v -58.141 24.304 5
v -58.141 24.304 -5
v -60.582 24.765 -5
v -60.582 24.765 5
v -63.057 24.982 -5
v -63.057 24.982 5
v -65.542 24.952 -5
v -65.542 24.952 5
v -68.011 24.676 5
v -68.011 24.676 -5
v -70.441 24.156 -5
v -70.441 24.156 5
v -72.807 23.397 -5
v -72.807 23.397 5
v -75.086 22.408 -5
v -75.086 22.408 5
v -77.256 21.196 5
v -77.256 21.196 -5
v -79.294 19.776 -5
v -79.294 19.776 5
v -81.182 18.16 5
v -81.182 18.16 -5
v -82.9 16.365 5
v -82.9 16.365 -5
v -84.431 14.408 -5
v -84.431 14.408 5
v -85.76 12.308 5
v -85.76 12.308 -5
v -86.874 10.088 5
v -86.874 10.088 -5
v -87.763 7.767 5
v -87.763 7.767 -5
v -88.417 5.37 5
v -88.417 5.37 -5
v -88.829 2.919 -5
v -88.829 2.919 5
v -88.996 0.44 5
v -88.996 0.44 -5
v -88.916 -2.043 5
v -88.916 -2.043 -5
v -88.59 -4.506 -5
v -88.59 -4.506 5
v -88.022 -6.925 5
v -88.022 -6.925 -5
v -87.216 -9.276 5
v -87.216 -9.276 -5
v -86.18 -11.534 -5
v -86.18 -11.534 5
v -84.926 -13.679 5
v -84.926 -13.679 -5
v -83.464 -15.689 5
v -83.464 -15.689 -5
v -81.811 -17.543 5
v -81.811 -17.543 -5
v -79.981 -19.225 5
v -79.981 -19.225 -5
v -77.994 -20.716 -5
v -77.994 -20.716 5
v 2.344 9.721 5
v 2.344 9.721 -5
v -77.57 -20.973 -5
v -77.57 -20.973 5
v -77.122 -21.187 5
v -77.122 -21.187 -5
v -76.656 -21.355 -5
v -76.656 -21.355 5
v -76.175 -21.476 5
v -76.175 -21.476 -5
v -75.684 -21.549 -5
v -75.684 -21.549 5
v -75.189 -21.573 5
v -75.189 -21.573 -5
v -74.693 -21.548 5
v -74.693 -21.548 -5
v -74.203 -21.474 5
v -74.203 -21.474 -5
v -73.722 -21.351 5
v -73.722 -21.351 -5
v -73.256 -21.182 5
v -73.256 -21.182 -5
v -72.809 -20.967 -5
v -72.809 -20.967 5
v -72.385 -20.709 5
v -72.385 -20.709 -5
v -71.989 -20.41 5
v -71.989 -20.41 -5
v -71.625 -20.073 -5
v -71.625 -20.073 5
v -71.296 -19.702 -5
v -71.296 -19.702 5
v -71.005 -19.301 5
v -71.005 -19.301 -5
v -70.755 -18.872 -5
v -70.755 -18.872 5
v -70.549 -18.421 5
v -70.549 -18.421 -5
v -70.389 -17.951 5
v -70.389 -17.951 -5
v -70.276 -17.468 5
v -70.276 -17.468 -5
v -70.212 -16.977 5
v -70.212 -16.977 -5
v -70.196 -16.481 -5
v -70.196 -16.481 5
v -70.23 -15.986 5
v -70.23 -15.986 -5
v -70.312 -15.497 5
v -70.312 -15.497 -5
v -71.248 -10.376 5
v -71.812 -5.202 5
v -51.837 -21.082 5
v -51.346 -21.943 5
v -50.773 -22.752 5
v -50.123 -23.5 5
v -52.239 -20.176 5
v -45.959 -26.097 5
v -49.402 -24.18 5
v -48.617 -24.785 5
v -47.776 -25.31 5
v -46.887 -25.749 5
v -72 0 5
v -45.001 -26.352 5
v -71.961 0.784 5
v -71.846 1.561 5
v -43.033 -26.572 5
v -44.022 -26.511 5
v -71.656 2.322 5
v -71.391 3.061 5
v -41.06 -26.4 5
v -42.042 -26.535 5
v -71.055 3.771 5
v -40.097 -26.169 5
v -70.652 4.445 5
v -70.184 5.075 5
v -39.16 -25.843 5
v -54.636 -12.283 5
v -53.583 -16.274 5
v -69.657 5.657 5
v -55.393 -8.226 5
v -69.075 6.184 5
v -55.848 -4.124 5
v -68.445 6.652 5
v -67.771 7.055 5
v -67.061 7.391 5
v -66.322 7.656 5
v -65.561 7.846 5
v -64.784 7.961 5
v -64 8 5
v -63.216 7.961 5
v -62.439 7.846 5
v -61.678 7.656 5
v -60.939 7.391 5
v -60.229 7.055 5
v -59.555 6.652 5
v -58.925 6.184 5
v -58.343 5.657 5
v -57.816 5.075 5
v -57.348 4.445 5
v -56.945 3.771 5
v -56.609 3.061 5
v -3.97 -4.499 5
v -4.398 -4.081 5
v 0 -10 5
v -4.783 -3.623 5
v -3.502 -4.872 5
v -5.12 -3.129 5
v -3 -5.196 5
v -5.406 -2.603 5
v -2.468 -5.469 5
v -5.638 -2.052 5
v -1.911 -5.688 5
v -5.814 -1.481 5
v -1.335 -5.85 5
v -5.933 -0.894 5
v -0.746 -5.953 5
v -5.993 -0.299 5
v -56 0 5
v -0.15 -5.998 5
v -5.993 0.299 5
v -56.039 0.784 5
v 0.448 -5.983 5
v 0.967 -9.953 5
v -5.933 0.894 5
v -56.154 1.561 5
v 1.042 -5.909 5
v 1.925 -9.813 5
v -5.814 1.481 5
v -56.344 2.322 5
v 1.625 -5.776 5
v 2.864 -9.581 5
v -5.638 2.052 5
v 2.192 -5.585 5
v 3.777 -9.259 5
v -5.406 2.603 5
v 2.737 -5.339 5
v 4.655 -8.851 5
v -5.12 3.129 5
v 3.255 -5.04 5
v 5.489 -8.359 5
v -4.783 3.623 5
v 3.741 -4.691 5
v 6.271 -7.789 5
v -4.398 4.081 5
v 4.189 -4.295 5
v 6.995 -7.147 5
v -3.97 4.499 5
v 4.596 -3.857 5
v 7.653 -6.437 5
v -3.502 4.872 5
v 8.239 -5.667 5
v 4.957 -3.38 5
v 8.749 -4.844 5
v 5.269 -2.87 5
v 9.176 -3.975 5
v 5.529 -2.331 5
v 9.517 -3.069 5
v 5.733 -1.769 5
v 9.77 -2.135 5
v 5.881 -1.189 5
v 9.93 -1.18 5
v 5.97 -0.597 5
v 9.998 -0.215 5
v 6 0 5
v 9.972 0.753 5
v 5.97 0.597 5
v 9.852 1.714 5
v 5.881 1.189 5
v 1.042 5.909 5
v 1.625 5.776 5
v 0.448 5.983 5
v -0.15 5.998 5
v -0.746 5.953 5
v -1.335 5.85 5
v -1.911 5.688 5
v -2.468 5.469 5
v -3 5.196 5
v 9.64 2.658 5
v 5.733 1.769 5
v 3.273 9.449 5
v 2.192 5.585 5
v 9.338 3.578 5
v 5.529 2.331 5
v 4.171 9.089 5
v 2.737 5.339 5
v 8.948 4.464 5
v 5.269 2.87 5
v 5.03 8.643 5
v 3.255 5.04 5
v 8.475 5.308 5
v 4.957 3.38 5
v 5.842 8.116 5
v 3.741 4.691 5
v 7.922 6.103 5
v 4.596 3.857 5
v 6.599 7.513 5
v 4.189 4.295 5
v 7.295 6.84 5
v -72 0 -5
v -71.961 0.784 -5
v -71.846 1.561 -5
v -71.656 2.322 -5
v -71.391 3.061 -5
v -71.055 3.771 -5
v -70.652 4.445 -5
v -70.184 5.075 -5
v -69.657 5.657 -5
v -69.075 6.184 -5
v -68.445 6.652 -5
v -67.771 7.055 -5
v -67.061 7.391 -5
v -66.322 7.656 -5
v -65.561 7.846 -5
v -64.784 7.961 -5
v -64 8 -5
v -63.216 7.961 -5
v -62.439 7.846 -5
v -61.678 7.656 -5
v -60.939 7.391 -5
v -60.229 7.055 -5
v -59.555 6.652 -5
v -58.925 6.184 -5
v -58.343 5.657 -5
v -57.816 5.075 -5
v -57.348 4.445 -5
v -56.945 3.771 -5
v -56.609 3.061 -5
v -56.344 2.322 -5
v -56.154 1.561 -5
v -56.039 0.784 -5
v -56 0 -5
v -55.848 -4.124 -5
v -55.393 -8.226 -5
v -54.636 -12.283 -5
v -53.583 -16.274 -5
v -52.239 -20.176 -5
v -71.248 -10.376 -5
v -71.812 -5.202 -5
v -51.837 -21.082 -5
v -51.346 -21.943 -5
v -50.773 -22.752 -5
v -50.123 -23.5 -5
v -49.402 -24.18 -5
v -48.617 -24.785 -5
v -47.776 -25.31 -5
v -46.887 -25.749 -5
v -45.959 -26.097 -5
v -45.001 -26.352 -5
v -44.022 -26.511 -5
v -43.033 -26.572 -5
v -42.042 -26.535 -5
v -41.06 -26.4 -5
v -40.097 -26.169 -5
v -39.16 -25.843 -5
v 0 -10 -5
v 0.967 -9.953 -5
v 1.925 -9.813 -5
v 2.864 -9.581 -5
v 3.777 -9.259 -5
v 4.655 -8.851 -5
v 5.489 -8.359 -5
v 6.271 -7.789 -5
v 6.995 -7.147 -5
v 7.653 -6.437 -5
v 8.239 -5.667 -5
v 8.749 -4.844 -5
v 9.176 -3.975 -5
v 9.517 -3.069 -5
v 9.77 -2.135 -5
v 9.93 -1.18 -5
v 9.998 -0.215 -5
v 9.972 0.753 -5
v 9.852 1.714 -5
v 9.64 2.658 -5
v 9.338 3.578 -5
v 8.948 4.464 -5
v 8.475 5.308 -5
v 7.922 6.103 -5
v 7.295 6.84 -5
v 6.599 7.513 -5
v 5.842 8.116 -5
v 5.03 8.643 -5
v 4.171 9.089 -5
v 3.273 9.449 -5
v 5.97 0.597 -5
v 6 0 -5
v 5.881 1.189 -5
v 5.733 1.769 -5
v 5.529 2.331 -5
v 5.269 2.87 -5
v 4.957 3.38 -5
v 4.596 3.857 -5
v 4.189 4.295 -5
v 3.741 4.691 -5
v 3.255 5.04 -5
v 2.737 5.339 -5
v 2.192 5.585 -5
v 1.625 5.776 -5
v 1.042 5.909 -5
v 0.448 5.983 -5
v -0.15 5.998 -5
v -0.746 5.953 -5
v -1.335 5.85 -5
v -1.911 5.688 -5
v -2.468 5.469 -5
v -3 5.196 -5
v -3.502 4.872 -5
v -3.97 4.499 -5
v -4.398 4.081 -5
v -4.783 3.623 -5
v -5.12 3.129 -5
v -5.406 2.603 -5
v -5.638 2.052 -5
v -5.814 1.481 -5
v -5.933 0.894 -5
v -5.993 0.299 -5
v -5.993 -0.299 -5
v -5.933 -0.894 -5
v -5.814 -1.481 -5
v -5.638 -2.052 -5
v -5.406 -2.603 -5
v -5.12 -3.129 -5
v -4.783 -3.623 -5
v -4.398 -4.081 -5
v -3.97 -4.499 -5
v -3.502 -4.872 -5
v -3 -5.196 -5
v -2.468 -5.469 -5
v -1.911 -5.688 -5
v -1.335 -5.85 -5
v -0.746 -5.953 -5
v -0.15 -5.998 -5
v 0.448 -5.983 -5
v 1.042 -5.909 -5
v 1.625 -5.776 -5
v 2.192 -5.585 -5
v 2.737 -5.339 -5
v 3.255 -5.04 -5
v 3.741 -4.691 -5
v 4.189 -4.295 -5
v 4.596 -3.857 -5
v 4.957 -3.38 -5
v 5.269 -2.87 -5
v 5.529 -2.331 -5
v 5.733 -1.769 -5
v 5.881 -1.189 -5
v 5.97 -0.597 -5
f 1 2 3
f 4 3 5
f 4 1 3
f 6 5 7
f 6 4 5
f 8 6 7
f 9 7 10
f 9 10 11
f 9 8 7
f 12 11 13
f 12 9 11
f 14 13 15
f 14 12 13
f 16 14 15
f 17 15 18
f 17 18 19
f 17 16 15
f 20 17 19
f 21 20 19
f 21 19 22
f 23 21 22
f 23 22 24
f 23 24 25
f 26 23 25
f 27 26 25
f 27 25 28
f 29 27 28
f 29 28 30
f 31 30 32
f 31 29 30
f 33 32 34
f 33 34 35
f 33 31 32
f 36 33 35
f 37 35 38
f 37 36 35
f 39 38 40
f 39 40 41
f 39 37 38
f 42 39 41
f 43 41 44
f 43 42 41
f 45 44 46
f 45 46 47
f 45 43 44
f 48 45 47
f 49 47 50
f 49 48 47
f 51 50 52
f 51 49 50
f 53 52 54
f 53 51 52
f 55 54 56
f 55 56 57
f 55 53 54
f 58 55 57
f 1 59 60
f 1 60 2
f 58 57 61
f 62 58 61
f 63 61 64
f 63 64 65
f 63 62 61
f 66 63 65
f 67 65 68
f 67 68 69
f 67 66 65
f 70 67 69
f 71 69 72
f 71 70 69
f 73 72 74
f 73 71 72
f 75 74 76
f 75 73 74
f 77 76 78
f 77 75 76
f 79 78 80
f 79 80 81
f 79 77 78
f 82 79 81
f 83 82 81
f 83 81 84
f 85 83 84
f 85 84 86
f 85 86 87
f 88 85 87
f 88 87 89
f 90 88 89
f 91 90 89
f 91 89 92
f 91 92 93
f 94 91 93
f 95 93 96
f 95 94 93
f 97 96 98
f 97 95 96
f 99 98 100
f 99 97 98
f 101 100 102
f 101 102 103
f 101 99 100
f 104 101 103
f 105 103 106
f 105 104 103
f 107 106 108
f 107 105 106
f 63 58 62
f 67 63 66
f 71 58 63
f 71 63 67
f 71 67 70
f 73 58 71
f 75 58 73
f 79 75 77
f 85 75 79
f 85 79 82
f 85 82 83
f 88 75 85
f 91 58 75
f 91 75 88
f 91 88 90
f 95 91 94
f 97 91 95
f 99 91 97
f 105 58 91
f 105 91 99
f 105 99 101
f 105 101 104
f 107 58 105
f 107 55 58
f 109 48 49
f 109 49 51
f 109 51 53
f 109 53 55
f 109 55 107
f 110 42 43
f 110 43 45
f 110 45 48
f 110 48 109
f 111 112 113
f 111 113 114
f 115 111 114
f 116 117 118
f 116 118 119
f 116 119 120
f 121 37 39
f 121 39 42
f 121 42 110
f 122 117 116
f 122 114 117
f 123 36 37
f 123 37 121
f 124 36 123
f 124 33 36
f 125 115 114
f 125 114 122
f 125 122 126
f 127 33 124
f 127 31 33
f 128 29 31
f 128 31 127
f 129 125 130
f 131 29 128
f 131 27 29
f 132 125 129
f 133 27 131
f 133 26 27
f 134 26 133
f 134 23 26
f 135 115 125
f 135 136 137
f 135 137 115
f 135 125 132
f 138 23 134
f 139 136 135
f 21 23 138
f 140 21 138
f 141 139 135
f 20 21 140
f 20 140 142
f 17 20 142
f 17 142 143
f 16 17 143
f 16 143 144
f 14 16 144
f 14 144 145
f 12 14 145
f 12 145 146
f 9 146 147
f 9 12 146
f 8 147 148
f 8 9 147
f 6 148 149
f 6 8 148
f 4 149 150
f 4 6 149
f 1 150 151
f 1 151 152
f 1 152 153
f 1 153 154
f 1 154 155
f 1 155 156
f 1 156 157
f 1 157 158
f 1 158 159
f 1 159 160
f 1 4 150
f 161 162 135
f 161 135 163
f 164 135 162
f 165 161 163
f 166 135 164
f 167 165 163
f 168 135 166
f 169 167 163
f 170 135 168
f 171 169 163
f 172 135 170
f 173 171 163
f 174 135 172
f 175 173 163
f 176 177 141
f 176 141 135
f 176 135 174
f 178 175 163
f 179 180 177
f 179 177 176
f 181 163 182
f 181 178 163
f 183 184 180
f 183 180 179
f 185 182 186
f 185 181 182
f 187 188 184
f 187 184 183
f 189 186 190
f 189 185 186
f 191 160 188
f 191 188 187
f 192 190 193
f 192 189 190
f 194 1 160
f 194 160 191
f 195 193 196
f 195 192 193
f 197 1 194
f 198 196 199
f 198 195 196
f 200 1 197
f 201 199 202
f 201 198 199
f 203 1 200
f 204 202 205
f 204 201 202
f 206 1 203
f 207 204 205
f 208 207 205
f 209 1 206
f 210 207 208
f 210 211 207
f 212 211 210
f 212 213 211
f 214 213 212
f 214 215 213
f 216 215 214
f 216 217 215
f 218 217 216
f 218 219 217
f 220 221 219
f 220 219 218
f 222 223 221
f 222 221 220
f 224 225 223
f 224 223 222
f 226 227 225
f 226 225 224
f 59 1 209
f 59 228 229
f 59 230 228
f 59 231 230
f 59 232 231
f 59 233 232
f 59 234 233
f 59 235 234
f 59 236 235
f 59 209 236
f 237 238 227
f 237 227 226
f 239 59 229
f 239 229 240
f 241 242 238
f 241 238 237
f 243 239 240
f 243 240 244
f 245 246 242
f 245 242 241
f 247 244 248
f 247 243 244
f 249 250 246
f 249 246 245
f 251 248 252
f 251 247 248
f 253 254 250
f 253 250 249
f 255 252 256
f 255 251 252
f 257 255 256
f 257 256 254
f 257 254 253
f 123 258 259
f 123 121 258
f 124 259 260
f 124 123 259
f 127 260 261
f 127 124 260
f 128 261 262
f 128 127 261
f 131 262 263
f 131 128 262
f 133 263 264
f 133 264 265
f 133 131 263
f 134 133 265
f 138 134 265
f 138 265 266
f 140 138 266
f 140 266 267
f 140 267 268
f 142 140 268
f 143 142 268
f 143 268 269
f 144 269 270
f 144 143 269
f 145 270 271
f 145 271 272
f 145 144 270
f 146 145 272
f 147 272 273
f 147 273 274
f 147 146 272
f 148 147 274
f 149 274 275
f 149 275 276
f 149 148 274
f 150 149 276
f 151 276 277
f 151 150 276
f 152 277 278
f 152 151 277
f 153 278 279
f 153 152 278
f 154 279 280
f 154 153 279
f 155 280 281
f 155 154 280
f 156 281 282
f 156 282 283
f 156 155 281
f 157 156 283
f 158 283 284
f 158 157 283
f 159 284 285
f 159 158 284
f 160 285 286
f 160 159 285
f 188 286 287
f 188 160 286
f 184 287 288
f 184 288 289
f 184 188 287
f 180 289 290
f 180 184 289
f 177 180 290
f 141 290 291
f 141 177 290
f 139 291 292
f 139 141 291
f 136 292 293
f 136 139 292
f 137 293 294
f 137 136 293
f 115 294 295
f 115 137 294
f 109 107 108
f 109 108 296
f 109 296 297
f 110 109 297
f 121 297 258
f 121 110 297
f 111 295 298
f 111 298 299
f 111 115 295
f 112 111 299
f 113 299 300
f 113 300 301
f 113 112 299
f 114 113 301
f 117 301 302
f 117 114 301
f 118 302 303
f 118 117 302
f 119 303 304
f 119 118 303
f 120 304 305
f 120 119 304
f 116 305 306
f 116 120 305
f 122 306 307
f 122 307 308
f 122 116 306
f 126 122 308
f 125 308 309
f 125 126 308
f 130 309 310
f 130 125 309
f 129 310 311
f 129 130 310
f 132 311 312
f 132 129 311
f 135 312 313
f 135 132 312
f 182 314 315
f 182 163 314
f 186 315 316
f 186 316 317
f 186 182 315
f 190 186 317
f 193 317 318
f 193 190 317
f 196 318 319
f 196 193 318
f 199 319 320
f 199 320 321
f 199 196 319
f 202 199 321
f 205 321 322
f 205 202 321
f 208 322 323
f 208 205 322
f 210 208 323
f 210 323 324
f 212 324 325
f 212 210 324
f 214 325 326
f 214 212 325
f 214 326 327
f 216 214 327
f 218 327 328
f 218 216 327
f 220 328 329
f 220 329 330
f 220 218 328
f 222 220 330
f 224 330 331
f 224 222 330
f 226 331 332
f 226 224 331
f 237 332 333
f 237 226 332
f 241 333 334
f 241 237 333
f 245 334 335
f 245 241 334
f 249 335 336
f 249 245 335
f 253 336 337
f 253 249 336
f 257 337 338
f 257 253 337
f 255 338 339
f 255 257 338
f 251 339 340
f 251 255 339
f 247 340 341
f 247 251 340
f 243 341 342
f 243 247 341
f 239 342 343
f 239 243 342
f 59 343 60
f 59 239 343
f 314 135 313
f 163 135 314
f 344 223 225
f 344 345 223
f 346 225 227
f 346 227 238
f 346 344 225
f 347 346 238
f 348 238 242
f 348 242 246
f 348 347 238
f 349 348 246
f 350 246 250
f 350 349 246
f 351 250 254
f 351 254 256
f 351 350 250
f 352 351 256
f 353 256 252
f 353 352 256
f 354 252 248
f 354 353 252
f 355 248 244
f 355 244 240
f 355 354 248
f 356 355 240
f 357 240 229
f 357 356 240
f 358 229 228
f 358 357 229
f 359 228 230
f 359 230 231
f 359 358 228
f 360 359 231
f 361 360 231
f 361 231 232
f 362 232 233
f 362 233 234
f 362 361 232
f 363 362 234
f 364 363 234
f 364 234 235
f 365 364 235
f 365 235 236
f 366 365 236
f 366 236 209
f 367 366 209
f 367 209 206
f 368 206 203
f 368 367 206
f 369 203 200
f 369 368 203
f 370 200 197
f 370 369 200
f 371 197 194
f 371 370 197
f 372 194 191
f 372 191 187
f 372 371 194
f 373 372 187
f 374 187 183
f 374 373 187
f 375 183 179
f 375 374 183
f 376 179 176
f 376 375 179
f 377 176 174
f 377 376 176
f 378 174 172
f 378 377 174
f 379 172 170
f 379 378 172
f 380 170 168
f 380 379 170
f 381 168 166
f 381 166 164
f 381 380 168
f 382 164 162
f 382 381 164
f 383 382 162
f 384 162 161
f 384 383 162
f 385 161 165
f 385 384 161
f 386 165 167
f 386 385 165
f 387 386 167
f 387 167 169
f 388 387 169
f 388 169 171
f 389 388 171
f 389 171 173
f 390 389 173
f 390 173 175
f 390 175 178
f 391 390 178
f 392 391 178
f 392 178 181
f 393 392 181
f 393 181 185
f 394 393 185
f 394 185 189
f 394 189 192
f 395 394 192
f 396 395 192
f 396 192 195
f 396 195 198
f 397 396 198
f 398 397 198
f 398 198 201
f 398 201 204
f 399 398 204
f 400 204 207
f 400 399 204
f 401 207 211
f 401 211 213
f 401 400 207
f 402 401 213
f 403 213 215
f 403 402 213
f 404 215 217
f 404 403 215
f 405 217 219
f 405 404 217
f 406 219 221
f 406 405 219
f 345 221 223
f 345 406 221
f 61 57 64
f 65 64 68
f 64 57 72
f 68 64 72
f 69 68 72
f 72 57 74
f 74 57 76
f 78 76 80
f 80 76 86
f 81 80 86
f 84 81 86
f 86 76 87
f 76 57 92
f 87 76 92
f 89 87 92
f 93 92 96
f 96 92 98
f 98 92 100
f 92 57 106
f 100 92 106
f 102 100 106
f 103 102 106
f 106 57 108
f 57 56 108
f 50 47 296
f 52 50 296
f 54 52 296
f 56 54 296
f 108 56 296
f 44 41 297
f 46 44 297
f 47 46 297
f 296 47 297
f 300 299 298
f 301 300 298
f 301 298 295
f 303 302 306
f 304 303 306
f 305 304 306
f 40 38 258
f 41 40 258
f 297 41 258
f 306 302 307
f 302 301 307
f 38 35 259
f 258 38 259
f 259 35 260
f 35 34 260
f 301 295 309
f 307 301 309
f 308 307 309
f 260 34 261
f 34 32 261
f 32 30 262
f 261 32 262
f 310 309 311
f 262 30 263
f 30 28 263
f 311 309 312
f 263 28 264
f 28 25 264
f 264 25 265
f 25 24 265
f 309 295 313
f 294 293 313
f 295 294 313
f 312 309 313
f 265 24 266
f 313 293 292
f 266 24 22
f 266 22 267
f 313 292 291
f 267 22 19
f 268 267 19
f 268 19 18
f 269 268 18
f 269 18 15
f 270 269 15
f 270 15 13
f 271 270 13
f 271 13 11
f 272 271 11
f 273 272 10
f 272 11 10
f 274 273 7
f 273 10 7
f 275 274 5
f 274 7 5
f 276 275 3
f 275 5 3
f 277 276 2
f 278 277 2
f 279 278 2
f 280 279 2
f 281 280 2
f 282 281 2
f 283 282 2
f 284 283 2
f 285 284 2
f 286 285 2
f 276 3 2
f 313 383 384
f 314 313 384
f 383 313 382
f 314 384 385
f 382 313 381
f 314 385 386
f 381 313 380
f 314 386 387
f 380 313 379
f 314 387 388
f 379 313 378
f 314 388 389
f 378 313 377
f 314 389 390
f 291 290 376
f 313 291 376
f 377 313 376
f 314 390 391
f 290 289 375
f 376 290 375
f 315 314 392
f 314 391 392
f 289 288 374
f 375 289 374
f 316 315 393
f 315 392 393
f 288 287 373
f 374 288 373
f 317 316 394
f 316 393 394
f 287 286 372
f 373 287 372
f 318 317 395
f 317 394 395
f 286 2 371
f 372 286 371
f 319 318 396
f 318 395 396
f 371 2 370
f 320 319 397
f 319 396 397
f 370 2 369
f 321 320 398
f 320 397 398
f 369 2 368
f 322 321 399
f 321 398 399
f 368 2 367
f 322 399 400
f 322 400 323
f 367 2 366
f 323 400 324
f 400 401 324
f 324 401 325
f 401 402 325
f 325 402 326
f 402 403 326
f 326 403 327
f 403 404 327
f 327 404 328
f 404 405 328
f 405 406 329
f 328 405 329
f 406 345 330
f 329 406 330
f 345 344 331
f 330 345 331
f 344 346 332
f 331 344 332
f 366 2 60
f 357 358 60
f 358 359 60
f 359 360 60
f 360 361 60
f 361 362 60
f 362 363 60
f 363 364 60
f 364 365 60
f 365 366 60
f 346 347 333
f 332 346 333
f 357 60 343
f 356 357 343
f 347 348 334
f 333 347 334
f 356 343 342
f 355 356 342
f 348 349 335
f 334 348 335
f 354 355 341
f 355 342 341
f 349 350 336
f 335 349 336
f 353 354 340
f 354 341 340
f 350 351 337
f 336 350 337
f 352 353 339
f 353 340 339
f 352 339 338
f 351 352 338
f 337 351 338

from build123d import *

# Parameters (mm, degrees)
SKETCH1_R           = 6
BOSS_EXTRUDE1_DEPTH = 5


with BuildPart() as part:
    # Sketch1 → Boss-Extrude1 (new, symmetric)
    with BuildSketch(Plane.XY):
        with BuildLine():
            ThreePointArc((0, -10), (9.930121511, -1.180121511), (2.34375, 9.721462644))
            Line((2.34375, 9.721462644), (-58.140625, 24.30365661))
            ThreePointArc((-58.140625, 24.30365661), (-86.874486916, 10.08750952), (-77.994140625, -20.716274476))
            ThreePointArc((-77.994140625, -20.716274476), (-72.385268542, -20.708675871), (-70.3125, -15.496849478))
            ThreePointArc((-70.3125, -15.496849478), (-71.576881743, -7.794228634), (-72, 0))
            ThreePointArc((-72, 0), (-64, 8), (-56, 0))
            ThreePointArc((-56, 0), (-55.051774585, -10.261681883), (-52.239210176, -20.175849925))
            ThreePointArc((-52.239210176, -20.175849925), (-46.886715458, -25.748635939), (-39.160382636, -25.843107024))
            Line((-39.160382636, -25.843107024), (0, -10))
        make_face()
        Circle(SKETCH1_R, mode=Mode.SUBTRACT)
    extrude(amount=BOSS_EXTRUDE1_DEPTH, both=True)


solid = part.part
